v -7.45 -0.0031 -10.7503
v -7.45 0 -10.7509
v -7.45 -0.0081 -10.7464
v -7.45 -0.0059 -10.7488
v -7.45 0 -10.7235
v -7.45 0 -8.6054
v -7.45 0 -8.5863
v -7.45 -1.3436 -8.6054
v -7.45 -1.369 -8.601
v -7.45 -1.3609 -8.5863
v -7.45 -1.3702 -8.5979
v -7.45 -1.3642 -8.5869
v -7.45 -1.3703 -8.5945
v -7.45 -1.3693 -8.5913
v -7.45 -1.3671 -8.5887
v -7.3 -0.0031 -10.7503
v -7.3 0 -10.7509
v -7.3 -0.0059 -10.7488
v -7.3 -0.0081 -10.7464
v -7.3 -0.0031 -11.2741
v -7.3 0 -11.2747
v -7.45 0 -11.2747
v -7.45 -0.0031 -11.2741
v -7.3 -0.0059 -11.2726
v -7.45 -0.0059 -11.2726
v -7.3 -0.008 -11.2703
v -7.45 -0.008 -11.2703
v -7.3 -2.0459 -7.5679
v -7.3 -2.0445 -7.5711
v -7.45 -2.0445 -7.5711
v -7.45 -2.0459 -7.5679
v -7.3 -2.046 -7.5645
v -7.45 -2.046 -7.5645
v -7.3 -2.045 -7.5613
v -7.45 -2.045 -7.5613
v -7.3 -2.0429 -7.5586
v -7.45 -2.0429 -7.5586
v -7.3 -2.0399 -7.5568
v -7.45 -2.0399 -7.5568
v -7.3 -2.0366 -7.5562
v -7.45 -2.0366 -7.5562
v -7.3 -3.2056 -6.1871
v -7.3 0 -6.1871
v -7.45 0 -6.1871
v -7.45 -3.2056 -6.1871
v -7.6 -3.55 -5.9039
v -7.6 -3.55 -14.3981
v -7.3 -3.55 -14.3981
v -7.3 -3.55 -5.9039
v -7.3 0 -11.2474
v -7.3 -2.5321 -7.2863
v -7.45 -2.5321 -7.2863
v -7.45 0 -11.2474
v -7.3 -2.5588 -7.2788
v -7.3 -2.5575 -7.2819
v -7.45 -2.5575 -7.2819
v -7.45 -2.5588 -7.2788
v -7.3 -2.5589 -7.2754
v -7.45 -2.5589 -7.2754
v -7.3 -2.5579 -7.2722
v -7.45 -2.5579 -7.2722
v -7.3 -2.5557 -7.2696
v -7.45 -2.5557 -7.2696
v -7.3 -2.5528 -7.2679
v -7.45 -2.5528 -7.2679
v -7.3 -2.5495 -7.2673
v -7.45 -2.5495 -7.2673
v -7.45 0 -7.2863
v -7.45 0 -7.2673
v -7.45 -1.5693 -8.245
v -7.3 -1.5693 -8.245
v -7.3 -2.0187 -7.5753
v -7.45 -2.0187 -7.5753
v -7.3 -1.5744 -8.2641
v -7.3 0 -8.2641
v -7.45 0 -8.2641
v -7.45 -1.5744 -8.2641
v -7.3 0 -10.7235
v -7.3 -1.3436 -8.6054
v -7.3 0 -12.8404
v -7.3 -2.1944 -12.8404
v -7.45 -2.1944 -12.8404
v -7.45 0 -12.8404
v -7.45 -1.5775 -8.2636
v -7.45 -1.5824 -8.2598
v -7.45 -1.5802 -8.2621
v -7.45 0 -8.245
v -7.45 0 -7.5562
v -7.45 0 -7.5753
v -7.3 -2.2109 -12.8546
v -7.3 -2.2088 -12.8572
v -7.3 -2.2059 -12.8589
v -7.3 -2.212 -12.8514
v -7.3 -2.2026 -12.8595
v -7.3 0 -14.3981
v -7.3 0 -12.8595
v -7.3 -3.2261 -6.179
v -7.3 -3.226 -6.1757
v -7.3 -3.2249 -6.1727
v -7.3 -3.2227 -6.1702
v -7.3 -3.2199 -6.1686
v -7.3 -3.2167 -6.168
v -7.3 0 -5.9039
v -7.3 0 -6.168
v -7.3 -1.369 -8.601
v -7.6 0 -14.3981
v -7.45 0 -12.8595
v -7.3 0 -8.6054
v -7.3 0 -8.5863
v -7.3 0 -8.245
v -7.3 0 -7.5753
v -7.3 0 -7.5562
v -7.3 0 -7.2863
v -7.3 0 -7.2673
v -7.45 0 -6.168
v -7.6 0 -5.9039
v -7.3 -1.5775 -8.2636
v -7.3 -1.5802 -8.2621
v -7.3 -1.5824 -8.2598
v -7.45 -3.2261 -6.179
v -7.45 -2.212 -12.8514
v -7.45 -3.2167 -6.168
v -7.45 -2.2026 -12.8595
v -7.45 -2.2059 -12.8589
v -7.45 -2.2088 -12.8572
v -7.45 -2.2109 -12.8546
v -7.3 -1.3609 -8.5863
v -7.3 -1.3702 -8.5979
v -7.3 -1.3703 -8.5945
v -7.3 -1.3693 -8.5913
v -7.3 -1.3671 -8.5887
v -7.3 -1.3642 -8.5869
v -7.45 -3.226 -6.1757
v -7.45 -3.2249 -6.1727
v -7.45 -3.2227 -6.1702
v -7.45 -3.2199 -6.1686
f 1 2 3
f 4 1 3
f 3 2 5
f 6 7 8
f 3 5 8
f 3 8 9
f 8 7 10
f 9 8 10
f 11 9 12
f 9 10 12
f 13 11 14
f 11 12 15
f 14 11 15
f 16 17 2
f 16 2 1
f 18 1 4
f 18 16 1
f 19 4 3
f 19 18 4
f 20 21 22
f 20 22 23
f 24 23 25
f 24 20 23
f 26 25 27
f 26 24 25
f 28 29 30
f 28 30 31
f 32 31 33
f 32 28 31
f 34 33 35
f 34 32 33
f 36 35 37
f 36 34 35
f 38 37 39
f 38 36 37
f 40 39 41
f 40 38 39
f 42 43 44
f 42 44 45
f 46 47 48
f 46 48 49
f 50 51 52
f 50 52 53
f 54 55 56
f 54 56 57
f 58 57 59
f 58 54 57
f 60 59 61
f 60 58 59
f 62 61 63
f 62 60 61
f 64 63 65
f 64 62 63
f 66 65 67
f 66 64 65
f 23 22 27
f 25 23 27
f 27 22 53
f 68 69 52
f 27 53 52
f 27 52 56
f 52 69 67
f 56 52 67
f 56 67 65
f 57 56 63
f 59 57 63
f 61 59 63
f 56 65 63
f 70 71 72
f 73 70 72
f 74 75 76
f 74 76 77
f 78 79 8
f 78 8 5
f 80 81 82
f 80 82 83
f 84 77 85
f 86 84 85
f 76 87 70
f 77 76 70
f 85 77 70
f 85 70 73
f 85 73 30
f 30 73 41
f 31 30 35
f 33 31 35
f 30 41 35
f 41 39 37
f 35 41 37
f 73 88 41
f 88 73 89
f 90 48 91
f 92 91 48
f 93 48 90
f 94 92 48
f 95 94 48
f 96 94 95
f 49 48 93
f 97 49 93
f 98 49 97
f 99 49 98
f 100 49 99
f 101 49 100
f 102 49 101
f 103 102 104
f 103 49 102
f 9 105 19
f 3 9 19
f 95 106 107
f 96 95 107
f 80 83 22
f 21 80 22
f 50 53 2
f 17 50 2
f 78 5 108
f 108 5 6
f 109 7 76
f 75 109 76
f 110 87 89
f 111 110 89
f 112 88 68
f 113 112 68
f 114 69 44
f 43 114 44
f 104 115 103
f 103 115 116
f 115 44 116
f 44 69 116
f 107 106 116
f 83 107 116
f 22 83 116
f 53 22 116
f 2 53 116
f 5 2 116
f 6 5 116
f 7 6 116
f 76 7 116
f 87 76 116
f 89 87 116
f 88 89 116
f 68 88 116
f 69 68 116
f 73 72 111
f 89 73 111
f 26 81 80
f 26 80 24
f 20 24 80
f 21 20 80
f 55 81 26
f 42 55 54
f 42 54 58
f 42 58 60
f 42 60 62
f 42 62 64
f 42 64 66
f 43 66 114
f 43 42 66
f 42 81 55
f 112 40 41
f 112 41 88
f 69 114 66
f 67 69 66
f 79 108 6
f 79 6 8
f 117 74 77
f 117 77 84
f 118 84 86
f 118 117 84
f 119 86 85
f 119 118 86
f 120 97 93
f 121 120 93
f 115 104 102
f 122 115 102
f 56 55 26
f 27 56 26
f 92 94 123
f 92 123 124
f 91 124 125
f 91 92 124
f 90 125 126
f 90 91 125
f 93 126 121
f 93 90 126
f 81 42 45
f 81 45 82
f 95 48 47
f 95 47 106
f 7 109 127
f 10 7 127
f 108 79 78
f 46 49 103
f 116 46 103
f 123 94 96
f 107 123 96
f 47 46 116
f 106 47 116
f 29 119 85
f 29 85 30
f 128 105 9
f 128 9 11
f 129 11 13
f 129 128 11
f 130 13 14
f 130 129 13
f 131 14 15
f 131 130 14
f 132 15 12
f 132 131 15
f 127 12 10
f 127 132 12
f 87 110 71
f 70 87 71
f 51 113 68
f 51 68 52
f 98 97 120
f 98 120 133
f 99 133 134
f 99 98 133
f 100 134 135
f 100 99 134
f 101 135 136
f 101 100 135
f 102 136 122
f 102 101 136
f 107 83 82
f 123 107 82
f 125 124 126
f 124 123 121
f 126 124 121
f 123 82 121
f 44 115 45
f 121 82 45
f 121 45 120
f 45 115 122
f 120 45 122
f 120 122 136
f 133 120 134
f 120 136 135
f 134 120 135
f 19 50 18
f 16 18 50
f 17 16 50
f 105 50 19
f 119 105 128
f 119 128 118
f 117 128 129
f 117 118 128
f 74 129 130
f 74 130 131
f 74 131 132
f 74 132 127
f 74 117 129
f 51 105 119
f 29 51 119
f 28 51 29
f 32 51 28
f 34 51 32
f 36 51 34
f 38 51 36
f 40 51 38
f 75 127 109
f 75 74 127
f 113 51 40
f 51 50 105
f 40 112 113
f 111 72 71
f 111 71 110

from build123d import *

# Parameters (mm, degrees)
SKETCH024_W     = 3.55
SKETCH024_H     = 8.9
PAD005_DEPTH    = 0.3
POCKET019_DEPTH = 0.15
SKETCH028_W     = 3.55
SKETCH028_H     = 0.203896
SKETCH028_H_2   = 0.201918
POCKET021_DEPTH = 5


with BuildPart() as part:
    # Sketch024 (on Face1 of Binder005) → Pad005 (new body)
    with BuildSketch(Plane.YZ.offset(-7.6)):
        with Locations((-1.775, -10.15)):
            Rectangle(SKETCH024_W, SKETCH024_H)
    extrude(amount=PAD005_DEPTH)

    # Sketch025 (on Face6 of Pad005) → Pocket019 (cut)
    with BuildSketch(Plane.YZ.offset(-7.3)):
        with BuildLine():
            ThreePointArc((0, -7.556224), (0.009539, -7.565763), (0, -7.575302))
            Line((-2.018681, -7.575302), (0, -7.575302))
            Line((-1.569349, -8.244981), (-2.018681, -7.575302))
            Line((0, -8.244981), (-1.569349, -8.244981))
            ThreePointArc((0, -8.244981), (0.009539, -8.25452), (0, -8.264059))
            Line((0, -8.264059), (-1.574436, -8.264059))
            ThreePointArc((-1.574436, -8.264059), (-1.578925, -8.262937), (-1.582357, -8.259835))
            Line((-1.582357, -8.259835), (-2.04449, -7.571078))
            ThreePointArc((-2.04449, -7.571078), (-2.044986, -7.561274), (-2.036569, -7.556224))
            Line((-2.036569, -7.556224), (0, -7.556224))
        make_face()
        with BuildLine():
            ThreePointArc((0, -12.840392), (0.009539, -12.849931), (0, -12.85947))
            Line((-2.202587, -12.85947), (0, -12.85947))
            ThreePointArc((-2.202587, -12.85947), (-2.208805, -12.857165), (-2.212018, -12.851364))
            Line((-3.226092, -6.178992), (-2.212018, -12.851364))
            ThreePointArc((-3.226092, -6.178992), (-3.223895, -6.171341), (-3.216661, -6.16802))
            Line((0, -6.16802), (-3.216661, -6.16802))
            ThreePointArc((0, -6.16802), (0.009539, -6.177559), (0, -6.187098))
            Line((0, -6.187098), (-3.205562, -6.187098))
            Line((-3.205562, -6.187098), (-2.194388, -12.840392))
            Line((-2.194388, -12.840392), (0, -12.840392))
        make_face()
        with BuildLine():
            Line((-0.680454, -8.605411), (-1.343559, -8.605411))
            Line((-1.343559, -8.605411), (0.008055, -10.736207))
            ThreePointArc((0.008055, -10.736207), (0.00511, -10.749372), (-0.008055, -10.746427))
            Line((-1.368962, -8.600982), (-0.008055, -10.746427))
            ThreePointArc((-1.368962, -8.600982), (-1.369266, -8.591276), (-1.360907, -8.586333))
            Line((-0.680454, -8.586333), (-1.360907, -8.586333))
            Line((0, -8.586333), (-0.680454, -8.586333))
            ThreePointArc((0, -8.586333), (0.009539, -8.595872), (0, -8.605411))
            Line((0, -8.605411), (-0.680454, -8.605411))
        make_face()
        with BuildLine():
            Line((-1.274751, -7.286347), (-2.532082, -7.286347))
            Line((-2.532082, -7.286347), (0.008037, -11.259983))
            ThreePointArc((0.008037, -11.259983), (0.005138, -11.273158), (-0.008037, -11.270259))
            Line((-2.557539, -7.281946), (-0.008037, -11.270259))
            ThreePointArc((-2.557539, -7.281946), (-2.557869, -7.272226), (-2.549502, -7.267269))
            Line((-1.274751, -7.267269), (-2.549502, -7.267269))
            Line((0, -7.267269), (-1.274751, -7.267269))
            ThreePointArc((0, -7.267269), (0.009539, -7.276808), (0, -7.286347))
            Line((0, -7.286347), (-1.274751, -7.286347))
        make_face()
    extrude(amount=-POCKET019_DEPTH, mode=Mode.SUBTRACT)

    # Sketch028 (on Face4 of Pocket019) → Pocket021 (cut)
    with BuildSketch(Plane.YZ.offset(-7.3)):
        with Locations((-1.775, -5.801948)):
            Rectangle(SKETCH028_W, SKETCH028_H)
        with Locations((-1.775, -14.499041)):
            Rectangle(SKETCH028_W, SKETCH028_H_2)
    extrude(amount=-POCKET021_DEPTH, mode=Mode.SUBTRACT)


solid = part.part
